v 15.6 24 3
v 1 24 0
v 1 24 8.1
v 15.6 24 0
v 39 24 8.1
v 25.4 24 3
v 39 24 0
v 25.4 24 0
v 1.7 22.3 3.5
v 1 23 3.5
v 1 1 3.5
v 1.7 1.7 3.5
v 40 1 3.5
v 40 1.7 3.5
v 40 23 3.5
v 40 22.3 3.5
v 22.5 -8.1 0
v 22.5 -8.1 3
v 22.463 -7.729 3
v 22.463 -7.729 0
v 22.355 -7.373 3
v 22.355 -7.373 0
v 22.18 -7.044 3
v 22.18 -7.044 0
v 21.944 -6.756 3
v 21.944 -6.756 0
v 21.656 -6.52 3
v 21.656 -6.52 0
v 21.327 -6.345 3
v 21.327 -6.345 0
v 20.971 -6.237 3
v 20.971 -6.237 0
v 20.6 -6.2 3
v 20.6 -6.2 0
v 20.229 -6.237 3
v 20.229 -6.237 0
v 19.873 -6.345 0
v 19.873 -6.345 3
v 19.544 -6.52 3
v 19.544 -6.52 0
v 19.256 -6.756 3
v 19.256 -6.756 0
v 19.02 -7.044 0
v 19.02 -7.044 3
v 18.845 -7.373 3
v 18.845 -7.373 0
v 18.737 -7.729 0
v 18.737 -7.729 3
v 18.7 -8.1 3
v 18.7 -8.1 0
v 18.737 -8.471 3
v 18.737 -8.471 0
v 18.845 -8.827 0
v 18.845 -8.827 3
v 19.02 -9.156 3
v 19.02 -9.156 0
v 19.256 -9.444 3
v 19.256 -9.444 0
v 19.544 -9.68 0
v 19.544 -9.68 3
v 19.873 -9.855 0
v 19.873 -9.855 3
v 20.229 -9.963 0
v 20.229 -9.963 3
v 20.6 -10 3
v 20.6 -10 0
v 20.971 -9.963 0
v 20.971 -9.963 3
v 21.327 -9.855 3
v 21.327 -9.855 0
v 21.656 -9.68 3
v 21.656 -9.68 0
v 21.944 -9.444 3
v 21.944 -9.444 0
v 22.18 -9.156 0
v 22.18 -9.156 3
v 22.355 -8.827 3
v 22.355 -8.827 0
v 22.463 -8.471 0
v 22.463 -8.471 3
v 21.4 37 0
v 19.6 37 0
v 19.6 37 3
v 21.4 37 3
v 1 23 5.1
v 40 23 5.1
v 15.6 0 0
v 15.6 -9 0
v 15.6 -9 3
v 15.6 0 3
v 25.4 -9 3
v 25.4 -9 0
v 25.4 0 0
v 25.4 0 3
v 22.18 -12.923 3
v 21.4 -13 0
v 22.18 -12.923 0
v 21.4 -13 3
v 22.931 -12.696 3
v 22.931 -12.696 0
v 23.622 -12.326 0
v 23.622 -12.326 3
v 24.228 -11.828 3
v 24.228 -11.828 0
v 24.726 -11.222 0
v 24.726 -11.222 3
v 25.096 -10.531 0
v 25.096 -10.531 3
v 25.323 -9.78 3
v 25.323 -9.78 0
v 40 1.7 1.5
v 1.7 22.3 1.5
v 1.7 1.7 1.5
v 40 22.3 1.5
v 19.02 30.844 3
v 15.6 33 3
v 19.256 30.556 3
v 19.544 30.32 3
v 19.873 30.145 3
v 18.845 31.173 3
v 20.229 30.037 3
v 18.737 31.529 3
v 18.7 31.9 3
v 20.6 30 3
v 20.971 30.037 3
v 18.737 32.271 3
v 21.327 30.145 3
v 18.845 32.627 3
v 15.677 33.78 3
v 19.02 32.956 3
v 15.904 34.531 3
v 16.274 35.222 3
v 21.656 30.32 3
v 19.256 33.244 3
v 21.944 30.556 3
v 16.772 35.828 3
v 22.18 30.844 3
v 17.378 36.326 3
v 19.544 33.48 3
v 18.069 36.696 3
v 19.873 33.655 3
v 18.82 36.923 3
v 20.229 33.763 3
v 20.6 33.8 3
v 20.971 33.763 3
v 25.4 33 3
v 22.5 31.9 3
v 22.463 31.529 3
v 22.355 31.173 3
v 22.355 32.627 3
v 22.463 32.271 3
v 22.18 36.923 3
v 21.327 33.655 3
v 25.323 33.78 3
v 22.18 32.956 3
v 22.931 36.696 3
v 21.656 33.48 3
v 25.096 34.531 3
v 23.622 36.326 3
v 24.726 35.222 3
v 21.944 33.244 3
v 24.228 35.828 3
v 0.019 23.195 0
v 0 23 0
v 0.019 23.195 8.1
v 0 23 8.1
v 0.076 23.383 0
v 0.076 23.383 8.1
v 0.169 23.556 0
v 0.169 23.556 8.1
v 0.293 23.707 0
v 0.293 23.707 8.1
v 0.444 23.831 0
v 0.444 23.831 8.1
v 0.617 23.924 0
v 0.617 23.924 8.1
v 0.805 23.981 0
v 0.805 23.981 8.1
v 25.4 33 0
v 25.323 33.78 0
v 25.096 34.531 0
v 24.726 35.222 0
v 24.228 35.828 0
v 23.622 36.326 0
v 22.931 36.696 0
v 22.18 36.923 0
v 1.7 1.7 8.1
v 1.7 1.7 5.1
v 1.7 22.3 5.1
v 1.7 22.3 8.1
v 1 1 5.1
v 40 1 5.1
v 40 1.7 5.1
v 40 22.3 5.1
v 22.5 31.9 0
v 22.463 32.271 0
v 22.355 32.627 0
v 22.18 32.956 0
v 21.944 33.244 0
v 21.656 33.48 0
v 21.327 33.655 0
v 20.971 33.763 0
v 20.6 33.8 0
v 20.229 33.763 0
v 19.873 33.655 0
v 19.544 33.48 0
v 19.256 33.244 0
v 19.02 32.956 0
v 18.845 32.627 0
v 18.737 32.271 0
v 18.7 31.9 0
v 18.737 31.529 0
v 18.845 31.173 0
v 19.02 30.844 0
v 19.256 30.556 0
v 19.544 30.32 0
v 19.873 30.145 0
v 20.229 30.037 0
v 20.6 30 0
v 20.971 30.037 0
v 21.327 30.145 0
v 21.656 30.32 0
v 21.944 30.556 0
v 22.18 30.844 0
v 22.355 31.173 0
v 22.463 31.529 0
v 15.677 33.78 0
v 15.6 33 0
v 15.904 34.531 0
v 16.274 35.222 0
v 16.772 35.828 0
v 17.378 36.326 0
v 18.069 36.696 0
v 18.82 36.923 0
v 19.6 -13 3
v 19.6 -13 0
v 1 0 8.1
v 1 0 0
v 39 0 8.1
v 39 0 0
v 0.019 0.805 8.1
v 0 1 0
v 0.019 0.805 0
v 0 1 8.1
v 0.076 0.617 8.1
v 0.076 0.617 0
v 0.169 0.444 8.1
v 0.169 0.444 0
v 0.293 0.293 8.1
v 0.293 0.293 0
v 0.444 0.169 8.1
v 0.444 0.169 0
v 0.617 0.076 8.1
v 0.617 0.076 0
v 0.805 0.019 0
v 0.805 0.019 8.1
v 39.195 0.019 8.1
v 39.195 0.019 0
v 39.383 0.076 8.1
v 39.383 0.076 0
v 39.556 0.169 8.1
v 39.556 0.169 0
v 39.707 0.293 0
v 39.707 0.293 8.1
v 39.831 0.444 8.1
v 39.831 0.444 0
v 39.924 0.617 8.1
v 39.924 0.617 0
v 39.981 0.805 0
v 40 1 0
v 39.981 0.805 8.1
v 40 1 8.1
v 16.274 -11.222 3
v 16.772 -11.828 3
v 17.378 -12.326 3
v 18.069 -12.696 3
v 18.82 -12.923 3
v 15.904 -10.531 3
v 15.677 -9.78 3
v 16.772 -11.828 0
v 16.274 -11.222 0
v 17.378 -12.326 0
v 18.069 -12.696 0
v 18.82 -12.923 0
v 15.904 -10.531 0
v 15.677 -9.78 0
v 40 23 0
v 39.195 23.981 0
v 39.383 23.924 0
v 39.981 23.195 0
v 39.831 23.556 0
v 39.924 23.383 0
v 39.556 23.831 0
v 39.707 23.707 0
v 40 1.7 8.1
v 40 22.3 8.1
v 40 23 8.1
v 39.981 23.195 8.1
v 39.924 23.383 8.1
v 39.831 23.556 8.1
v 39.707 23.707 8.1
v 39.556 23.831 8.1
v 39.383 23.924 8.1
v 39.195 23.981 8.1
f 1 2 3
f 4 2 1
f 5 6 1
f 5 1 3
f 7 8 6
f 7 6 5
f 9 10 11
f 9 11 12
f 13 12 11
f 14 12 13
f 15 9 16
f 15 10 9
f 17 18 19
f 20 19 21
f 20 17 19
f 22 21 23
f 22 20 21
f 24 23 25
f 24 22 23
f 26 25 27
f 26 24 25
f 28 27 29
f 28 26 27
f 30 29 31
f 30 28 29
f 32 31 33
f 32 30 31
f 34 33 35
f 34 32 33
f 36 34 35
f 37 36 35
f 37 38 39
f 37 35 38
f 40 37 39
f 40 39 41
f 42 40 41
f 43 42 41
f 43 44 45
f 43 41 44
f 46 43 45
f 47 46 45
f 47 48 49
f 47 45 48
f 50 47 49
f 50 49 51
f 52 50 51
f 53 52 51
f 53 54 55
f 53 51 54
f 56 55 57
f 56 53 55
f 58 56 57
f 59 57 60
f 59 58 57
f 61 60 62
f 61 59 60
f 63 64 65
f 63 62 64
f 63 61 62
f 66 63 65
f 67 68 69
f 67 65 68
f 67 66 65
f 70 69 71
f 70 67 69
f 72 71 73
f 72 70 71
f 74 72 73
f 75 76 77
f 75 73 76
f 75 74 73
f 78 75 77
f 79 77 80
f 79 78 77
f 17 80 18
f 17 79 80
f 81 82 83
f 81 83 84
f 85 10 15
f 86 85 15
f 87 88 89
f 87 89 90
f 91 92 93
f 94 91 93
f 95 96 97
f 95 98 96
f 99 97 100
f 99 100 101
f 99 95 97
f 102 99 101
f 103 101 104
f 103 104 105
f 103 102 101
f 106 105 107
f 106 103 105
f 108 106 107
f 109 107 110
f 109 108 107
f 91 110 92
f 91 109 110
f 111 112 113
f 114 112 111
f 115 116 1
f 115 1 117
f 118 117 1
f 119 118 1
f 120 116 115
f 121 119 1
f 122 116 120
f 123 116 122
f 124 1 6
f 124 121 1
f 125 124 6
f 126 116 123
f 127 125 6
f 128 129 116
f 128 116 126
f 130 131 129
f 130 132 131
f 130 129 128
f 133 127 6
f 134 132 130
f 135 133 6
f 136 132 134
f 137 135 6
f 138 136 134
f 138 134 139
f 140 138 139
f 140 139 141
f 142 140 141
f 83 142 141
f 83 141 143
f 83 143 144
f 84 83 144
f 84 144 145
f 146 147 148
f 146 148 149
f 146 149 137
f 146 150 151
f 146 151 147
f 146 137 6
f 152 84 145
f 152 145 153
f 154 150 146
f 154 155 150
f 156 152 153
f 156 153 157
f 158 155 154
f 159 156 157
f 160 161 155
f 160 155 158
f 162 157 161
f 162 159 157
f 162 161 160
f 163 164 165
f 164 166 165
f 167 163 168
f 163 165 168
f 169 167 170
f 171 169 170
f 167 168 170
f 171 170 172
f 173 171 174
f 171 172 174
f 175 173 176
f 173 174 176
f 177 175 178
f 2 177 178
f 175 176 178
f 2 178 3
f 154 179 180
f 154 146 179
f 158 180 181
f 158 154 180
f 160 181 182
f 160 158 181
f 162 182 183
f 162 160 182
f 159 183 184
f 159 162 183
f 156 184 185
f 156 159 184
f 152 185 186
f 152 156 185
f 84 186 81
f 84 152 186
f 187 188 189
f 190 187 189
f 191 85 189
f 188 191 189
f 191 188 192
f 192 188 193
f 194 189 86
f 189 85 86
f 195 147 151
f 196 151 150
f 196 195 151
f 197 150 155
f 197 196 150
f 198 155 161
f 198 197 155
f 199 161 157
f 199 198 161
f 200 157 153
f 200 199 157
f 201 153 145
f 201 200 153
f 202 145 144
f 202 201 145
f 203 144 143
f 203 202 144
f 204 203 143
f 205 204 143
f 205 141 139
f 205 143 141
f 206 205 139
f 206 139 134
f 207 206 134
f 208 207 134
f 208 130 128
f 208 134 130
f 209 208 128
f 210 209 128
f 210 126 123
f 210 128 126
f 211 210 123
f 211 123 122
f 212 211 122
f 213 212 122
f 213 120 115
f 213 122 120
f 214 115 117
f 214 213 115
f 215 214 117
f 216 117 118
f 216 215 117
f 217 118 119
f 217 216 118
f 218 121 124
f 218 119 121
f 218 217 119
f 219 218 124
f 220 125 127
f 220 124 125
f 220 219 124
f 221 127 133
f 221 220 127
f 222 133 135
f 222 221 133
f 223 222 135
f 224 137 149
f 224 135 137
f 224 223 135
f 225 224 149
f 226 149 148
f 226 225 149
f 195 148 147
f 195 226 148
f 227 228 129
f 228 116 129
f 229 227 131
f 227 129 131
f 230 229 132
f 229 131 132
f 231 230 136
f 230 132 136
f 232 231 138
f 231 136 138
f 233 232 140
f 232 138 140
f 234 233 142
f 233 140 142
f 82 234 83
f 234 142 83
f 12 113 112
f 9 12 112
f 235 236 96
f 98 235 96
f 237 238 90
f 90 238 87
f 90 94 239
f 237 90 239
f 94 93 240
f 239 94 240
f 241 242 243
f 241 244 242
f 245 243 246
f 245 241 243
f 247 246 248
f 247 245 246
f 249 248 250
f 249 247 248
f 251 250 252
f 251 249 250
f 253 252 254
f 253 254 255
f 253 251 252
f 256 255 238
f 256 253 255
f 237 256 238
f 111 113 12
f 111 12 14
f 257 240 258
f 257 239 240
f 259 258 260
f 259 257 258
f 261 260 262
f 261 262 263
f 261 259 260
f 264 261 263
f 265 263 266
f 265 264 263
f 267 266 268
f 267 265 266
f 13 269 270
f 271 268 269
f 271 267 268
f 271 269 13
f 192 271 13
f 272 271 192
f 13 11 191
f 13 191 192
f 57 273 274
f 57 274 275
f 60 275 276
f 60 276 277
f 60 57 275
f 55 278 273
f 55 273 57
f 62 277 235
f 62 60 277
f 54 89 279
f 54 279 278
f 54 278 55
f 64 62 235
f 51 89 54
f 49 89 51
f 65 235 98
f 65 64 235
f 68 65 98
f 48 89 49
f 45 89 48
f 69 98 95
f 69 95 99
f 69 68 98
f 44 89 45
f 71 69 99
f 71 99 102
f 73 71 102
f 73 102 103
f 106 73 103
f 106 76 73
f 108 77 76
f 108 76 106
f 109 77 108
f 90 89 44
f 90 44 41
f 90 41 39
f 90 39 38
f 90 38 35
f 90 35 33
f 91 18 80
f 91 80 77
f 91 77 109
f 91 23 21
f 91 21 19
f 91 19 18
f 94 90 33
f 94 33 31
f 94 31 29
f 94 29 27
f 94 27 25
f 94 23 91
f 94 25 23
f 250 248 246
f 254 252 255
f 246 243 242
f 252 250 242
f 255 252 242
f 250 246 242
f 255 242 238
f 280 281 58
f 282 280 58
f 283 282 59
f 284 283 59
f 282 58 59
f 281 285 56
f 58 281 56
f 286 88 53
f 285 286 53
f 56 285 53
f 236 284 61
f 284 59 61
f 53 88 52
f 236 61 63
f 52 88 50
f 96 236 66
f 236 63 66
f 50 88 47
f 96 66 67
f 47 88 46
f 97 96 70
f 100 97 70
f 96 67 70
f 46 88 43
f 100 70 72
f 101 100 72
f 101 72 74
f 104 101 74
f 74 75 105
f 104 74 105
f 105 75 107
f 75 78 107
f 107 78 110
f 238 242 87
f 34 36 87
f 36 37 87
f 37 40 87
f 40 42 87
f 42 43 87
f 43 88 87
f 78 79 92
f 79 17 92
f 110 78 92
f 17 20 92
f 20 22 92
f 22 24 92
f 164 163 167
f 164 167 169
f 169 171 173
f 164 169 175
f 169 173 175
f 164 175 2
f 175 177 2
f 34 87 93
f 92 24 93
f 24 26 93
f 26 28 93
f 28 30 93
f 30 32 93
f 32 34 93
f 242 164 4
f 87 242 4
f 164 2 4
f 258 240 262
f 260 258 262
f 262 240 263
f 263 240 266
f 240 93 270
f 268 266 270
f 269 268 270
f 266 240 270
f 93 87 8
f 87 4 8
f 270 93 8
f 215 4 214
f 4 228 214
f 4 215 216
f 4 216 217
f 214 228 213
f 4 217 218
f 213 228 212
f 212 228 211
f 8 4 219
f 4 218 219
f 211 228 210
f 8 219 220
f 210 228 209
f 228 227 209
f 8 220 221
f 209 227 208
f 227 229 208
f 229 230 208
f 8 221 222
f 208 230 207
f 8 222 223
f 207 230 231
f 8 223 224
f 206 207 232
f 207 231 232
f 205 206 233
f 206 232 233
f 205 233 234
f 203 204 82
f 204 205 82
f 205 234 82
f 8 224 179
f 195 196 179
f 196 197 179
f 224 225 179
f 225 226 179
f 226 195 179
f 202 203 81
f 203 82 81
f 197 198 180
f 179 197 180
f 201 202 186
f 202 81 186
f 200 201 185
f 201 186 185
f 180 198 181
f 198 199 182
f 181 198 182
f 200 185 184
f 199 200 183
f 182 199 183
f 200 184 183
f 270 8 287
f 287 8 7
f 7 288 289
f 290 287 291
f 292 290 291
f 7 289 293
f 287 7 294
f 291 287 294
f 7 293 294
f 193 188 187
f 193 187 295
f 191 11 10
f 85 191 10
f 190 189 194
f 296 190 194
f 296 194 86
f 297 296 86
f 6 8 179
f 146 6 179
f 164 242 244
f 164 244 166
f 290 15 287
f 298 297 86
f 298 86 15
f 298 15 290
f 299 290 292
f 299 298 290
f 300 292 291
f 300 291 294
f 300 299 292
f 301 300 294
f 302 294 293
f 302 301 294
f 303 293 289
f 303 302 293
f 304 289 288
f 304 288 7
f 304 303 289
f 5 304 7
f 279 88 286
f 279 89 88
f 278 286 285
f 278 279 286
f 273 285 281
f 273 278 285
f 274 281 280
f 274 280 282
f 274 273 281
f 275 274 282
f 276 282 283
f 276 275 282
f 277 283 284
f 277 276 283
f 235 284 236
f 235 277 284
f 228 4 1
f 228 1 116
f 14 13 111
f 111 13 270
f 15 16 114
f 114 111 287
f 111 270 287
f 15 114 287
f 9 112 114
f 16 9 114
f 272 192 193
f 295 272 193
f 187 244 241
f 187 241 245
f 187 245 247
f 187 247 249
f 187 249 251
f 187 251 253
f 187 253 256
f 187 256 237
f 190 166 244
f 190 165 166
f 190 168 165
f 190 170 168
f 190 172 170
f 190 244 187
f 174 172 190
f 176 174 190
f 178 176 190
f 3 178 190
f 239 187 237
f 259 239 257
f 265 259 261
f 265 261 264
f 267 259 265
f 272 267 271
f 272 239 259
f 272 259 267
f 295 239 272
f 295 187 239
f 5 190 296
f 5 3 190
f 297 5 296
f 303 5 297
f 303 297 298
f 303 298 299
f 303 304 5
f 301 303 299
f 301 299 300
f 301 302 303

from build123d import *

# Parameters (mm, degrees)
BOX007_W          = 39
BOX007_H          = 22
BOX007_DEPTH      = 1.6
BOX006_W          = 38.6
BOX006_H          = 20.6
BOX006_DEPTH      = 6.6
BOX_W             = 40
BOX_H             = 24
BOX_DEPTH         = 8.1
FILLET_R          = 1
CYLINDER001_R     = 1.9
CYLINDER001_DEPTH = 10
ARRAY002_Y_COUNT  = 2
ARRAY002_Y_PITCH  = 40
BOX005_W          = 9.8
BOX005_H          = 50
BOX005_DEPTH      = 3
FILLET002_R       = 4


with BuildPart() as pcb_extract_cube:
    # Box007 → Box007 (new body)
    with BuildSketch(Plane(origin=(1, 1, 3.5), x_dir=(1, 0, 0), z_dir=(0, 0, 1))):
        with Locations((19.5, 11)):
            Rectangle(BOX007_W, BOX007_H)
    extrude(amount=BOX007_DEPTH)


with BuildPart() as extract_fusion:
    # Box006 → Box006 (new body)
    with BuildSketch(Plane(origin=(1.7, 1.7, 1.5), x_dir=(1, 0, 0), z_dir=(0, 0, 1))):
        with Locations((19.3, 10.3)):
            Rectangle(BOX006_W, BOX006_H)
    extrude(amount=BOX006_DEPTH)

    # Fusion: union pcb extract cube
    add(pcb_extract_cube.part)


with BuildPart() as external_fillet:
    # Box → Box (new body)
    with BuildSketch(Plane.XY):
        with Locations((20, 12)):
            Rectangle(BOX_W, BOX_H)
    extrude(amount=BOX_DEPTH)

    # Fillet
    fillet_edges = [external_fillet.edges().sort_by_distance(p)[0] for p in [
        (0, 0, 4.05),
        (0, 24, 4.05),
        (40, 0, 4.05),
        (40, 24, 4.05),
    ]]
    fillet(fillet_edges, radius=FILLET_R)


with BuildPart() as attach_hole_array:
    # Cylinder001 → Cylinder001 (new body)
    with BuildSketch(Plane(origin=(5, 4.9, 0), x_dir=(1, 0, 0), z_dir=(0, 0, 1))):
        Circle(CYLINDER001_R)
    extrude(amount=CYLINDER001_DEPTH)

    # Array002 Y: attach hole array ×2


with BuildPart() as attach_hole_array_1:
    add(attach_hole_array.part)
    with Locations(*[(0, i * ARRAY002_Y_PITCH, 0) for i in range(1, ARRAY002_Y_COUNT)]):
        add(attach_hole_array.part)


with BuildPart() as pl2303_cut:
    # Box005 → Box005 (new body)
    with BuildSketch(Plane.XY):
        with Locations((4.9, 25)):
            Rectangle(BOX005_W, BOX005_H)
    extrude(amount=BOX005_DEPTH)

    # Fillet002
    fillet002_edges = [pl2303_cut.edges().sort_by_distance(p)[0] for p in [
        (0, 0, 1.5),
        (0, 50, 1.5),
        (9.8, 0, 1.5),
        (9.8, 50, 1.5),
    ]]
    fillet(fillet002_edges, radius=FILLET002_R)

    # Cut002: cut attach hole array
    add(attach_hole_array_1.part, mode=Mode.SUBTRACT)


with BuildPart() as pl2303_cut_1:
    # Cut002 placement: moved
    add(pl2303_cut.part.moved(Location((15.6, -13, 0))))

    # Fusion001: union external fillet
    add(external_fillet.part)

    # Cut: cut extract fusion
    add(extract_fusion.part, mode=Mode.SUBTRACT)


solid = pl2303_cut_1.part
